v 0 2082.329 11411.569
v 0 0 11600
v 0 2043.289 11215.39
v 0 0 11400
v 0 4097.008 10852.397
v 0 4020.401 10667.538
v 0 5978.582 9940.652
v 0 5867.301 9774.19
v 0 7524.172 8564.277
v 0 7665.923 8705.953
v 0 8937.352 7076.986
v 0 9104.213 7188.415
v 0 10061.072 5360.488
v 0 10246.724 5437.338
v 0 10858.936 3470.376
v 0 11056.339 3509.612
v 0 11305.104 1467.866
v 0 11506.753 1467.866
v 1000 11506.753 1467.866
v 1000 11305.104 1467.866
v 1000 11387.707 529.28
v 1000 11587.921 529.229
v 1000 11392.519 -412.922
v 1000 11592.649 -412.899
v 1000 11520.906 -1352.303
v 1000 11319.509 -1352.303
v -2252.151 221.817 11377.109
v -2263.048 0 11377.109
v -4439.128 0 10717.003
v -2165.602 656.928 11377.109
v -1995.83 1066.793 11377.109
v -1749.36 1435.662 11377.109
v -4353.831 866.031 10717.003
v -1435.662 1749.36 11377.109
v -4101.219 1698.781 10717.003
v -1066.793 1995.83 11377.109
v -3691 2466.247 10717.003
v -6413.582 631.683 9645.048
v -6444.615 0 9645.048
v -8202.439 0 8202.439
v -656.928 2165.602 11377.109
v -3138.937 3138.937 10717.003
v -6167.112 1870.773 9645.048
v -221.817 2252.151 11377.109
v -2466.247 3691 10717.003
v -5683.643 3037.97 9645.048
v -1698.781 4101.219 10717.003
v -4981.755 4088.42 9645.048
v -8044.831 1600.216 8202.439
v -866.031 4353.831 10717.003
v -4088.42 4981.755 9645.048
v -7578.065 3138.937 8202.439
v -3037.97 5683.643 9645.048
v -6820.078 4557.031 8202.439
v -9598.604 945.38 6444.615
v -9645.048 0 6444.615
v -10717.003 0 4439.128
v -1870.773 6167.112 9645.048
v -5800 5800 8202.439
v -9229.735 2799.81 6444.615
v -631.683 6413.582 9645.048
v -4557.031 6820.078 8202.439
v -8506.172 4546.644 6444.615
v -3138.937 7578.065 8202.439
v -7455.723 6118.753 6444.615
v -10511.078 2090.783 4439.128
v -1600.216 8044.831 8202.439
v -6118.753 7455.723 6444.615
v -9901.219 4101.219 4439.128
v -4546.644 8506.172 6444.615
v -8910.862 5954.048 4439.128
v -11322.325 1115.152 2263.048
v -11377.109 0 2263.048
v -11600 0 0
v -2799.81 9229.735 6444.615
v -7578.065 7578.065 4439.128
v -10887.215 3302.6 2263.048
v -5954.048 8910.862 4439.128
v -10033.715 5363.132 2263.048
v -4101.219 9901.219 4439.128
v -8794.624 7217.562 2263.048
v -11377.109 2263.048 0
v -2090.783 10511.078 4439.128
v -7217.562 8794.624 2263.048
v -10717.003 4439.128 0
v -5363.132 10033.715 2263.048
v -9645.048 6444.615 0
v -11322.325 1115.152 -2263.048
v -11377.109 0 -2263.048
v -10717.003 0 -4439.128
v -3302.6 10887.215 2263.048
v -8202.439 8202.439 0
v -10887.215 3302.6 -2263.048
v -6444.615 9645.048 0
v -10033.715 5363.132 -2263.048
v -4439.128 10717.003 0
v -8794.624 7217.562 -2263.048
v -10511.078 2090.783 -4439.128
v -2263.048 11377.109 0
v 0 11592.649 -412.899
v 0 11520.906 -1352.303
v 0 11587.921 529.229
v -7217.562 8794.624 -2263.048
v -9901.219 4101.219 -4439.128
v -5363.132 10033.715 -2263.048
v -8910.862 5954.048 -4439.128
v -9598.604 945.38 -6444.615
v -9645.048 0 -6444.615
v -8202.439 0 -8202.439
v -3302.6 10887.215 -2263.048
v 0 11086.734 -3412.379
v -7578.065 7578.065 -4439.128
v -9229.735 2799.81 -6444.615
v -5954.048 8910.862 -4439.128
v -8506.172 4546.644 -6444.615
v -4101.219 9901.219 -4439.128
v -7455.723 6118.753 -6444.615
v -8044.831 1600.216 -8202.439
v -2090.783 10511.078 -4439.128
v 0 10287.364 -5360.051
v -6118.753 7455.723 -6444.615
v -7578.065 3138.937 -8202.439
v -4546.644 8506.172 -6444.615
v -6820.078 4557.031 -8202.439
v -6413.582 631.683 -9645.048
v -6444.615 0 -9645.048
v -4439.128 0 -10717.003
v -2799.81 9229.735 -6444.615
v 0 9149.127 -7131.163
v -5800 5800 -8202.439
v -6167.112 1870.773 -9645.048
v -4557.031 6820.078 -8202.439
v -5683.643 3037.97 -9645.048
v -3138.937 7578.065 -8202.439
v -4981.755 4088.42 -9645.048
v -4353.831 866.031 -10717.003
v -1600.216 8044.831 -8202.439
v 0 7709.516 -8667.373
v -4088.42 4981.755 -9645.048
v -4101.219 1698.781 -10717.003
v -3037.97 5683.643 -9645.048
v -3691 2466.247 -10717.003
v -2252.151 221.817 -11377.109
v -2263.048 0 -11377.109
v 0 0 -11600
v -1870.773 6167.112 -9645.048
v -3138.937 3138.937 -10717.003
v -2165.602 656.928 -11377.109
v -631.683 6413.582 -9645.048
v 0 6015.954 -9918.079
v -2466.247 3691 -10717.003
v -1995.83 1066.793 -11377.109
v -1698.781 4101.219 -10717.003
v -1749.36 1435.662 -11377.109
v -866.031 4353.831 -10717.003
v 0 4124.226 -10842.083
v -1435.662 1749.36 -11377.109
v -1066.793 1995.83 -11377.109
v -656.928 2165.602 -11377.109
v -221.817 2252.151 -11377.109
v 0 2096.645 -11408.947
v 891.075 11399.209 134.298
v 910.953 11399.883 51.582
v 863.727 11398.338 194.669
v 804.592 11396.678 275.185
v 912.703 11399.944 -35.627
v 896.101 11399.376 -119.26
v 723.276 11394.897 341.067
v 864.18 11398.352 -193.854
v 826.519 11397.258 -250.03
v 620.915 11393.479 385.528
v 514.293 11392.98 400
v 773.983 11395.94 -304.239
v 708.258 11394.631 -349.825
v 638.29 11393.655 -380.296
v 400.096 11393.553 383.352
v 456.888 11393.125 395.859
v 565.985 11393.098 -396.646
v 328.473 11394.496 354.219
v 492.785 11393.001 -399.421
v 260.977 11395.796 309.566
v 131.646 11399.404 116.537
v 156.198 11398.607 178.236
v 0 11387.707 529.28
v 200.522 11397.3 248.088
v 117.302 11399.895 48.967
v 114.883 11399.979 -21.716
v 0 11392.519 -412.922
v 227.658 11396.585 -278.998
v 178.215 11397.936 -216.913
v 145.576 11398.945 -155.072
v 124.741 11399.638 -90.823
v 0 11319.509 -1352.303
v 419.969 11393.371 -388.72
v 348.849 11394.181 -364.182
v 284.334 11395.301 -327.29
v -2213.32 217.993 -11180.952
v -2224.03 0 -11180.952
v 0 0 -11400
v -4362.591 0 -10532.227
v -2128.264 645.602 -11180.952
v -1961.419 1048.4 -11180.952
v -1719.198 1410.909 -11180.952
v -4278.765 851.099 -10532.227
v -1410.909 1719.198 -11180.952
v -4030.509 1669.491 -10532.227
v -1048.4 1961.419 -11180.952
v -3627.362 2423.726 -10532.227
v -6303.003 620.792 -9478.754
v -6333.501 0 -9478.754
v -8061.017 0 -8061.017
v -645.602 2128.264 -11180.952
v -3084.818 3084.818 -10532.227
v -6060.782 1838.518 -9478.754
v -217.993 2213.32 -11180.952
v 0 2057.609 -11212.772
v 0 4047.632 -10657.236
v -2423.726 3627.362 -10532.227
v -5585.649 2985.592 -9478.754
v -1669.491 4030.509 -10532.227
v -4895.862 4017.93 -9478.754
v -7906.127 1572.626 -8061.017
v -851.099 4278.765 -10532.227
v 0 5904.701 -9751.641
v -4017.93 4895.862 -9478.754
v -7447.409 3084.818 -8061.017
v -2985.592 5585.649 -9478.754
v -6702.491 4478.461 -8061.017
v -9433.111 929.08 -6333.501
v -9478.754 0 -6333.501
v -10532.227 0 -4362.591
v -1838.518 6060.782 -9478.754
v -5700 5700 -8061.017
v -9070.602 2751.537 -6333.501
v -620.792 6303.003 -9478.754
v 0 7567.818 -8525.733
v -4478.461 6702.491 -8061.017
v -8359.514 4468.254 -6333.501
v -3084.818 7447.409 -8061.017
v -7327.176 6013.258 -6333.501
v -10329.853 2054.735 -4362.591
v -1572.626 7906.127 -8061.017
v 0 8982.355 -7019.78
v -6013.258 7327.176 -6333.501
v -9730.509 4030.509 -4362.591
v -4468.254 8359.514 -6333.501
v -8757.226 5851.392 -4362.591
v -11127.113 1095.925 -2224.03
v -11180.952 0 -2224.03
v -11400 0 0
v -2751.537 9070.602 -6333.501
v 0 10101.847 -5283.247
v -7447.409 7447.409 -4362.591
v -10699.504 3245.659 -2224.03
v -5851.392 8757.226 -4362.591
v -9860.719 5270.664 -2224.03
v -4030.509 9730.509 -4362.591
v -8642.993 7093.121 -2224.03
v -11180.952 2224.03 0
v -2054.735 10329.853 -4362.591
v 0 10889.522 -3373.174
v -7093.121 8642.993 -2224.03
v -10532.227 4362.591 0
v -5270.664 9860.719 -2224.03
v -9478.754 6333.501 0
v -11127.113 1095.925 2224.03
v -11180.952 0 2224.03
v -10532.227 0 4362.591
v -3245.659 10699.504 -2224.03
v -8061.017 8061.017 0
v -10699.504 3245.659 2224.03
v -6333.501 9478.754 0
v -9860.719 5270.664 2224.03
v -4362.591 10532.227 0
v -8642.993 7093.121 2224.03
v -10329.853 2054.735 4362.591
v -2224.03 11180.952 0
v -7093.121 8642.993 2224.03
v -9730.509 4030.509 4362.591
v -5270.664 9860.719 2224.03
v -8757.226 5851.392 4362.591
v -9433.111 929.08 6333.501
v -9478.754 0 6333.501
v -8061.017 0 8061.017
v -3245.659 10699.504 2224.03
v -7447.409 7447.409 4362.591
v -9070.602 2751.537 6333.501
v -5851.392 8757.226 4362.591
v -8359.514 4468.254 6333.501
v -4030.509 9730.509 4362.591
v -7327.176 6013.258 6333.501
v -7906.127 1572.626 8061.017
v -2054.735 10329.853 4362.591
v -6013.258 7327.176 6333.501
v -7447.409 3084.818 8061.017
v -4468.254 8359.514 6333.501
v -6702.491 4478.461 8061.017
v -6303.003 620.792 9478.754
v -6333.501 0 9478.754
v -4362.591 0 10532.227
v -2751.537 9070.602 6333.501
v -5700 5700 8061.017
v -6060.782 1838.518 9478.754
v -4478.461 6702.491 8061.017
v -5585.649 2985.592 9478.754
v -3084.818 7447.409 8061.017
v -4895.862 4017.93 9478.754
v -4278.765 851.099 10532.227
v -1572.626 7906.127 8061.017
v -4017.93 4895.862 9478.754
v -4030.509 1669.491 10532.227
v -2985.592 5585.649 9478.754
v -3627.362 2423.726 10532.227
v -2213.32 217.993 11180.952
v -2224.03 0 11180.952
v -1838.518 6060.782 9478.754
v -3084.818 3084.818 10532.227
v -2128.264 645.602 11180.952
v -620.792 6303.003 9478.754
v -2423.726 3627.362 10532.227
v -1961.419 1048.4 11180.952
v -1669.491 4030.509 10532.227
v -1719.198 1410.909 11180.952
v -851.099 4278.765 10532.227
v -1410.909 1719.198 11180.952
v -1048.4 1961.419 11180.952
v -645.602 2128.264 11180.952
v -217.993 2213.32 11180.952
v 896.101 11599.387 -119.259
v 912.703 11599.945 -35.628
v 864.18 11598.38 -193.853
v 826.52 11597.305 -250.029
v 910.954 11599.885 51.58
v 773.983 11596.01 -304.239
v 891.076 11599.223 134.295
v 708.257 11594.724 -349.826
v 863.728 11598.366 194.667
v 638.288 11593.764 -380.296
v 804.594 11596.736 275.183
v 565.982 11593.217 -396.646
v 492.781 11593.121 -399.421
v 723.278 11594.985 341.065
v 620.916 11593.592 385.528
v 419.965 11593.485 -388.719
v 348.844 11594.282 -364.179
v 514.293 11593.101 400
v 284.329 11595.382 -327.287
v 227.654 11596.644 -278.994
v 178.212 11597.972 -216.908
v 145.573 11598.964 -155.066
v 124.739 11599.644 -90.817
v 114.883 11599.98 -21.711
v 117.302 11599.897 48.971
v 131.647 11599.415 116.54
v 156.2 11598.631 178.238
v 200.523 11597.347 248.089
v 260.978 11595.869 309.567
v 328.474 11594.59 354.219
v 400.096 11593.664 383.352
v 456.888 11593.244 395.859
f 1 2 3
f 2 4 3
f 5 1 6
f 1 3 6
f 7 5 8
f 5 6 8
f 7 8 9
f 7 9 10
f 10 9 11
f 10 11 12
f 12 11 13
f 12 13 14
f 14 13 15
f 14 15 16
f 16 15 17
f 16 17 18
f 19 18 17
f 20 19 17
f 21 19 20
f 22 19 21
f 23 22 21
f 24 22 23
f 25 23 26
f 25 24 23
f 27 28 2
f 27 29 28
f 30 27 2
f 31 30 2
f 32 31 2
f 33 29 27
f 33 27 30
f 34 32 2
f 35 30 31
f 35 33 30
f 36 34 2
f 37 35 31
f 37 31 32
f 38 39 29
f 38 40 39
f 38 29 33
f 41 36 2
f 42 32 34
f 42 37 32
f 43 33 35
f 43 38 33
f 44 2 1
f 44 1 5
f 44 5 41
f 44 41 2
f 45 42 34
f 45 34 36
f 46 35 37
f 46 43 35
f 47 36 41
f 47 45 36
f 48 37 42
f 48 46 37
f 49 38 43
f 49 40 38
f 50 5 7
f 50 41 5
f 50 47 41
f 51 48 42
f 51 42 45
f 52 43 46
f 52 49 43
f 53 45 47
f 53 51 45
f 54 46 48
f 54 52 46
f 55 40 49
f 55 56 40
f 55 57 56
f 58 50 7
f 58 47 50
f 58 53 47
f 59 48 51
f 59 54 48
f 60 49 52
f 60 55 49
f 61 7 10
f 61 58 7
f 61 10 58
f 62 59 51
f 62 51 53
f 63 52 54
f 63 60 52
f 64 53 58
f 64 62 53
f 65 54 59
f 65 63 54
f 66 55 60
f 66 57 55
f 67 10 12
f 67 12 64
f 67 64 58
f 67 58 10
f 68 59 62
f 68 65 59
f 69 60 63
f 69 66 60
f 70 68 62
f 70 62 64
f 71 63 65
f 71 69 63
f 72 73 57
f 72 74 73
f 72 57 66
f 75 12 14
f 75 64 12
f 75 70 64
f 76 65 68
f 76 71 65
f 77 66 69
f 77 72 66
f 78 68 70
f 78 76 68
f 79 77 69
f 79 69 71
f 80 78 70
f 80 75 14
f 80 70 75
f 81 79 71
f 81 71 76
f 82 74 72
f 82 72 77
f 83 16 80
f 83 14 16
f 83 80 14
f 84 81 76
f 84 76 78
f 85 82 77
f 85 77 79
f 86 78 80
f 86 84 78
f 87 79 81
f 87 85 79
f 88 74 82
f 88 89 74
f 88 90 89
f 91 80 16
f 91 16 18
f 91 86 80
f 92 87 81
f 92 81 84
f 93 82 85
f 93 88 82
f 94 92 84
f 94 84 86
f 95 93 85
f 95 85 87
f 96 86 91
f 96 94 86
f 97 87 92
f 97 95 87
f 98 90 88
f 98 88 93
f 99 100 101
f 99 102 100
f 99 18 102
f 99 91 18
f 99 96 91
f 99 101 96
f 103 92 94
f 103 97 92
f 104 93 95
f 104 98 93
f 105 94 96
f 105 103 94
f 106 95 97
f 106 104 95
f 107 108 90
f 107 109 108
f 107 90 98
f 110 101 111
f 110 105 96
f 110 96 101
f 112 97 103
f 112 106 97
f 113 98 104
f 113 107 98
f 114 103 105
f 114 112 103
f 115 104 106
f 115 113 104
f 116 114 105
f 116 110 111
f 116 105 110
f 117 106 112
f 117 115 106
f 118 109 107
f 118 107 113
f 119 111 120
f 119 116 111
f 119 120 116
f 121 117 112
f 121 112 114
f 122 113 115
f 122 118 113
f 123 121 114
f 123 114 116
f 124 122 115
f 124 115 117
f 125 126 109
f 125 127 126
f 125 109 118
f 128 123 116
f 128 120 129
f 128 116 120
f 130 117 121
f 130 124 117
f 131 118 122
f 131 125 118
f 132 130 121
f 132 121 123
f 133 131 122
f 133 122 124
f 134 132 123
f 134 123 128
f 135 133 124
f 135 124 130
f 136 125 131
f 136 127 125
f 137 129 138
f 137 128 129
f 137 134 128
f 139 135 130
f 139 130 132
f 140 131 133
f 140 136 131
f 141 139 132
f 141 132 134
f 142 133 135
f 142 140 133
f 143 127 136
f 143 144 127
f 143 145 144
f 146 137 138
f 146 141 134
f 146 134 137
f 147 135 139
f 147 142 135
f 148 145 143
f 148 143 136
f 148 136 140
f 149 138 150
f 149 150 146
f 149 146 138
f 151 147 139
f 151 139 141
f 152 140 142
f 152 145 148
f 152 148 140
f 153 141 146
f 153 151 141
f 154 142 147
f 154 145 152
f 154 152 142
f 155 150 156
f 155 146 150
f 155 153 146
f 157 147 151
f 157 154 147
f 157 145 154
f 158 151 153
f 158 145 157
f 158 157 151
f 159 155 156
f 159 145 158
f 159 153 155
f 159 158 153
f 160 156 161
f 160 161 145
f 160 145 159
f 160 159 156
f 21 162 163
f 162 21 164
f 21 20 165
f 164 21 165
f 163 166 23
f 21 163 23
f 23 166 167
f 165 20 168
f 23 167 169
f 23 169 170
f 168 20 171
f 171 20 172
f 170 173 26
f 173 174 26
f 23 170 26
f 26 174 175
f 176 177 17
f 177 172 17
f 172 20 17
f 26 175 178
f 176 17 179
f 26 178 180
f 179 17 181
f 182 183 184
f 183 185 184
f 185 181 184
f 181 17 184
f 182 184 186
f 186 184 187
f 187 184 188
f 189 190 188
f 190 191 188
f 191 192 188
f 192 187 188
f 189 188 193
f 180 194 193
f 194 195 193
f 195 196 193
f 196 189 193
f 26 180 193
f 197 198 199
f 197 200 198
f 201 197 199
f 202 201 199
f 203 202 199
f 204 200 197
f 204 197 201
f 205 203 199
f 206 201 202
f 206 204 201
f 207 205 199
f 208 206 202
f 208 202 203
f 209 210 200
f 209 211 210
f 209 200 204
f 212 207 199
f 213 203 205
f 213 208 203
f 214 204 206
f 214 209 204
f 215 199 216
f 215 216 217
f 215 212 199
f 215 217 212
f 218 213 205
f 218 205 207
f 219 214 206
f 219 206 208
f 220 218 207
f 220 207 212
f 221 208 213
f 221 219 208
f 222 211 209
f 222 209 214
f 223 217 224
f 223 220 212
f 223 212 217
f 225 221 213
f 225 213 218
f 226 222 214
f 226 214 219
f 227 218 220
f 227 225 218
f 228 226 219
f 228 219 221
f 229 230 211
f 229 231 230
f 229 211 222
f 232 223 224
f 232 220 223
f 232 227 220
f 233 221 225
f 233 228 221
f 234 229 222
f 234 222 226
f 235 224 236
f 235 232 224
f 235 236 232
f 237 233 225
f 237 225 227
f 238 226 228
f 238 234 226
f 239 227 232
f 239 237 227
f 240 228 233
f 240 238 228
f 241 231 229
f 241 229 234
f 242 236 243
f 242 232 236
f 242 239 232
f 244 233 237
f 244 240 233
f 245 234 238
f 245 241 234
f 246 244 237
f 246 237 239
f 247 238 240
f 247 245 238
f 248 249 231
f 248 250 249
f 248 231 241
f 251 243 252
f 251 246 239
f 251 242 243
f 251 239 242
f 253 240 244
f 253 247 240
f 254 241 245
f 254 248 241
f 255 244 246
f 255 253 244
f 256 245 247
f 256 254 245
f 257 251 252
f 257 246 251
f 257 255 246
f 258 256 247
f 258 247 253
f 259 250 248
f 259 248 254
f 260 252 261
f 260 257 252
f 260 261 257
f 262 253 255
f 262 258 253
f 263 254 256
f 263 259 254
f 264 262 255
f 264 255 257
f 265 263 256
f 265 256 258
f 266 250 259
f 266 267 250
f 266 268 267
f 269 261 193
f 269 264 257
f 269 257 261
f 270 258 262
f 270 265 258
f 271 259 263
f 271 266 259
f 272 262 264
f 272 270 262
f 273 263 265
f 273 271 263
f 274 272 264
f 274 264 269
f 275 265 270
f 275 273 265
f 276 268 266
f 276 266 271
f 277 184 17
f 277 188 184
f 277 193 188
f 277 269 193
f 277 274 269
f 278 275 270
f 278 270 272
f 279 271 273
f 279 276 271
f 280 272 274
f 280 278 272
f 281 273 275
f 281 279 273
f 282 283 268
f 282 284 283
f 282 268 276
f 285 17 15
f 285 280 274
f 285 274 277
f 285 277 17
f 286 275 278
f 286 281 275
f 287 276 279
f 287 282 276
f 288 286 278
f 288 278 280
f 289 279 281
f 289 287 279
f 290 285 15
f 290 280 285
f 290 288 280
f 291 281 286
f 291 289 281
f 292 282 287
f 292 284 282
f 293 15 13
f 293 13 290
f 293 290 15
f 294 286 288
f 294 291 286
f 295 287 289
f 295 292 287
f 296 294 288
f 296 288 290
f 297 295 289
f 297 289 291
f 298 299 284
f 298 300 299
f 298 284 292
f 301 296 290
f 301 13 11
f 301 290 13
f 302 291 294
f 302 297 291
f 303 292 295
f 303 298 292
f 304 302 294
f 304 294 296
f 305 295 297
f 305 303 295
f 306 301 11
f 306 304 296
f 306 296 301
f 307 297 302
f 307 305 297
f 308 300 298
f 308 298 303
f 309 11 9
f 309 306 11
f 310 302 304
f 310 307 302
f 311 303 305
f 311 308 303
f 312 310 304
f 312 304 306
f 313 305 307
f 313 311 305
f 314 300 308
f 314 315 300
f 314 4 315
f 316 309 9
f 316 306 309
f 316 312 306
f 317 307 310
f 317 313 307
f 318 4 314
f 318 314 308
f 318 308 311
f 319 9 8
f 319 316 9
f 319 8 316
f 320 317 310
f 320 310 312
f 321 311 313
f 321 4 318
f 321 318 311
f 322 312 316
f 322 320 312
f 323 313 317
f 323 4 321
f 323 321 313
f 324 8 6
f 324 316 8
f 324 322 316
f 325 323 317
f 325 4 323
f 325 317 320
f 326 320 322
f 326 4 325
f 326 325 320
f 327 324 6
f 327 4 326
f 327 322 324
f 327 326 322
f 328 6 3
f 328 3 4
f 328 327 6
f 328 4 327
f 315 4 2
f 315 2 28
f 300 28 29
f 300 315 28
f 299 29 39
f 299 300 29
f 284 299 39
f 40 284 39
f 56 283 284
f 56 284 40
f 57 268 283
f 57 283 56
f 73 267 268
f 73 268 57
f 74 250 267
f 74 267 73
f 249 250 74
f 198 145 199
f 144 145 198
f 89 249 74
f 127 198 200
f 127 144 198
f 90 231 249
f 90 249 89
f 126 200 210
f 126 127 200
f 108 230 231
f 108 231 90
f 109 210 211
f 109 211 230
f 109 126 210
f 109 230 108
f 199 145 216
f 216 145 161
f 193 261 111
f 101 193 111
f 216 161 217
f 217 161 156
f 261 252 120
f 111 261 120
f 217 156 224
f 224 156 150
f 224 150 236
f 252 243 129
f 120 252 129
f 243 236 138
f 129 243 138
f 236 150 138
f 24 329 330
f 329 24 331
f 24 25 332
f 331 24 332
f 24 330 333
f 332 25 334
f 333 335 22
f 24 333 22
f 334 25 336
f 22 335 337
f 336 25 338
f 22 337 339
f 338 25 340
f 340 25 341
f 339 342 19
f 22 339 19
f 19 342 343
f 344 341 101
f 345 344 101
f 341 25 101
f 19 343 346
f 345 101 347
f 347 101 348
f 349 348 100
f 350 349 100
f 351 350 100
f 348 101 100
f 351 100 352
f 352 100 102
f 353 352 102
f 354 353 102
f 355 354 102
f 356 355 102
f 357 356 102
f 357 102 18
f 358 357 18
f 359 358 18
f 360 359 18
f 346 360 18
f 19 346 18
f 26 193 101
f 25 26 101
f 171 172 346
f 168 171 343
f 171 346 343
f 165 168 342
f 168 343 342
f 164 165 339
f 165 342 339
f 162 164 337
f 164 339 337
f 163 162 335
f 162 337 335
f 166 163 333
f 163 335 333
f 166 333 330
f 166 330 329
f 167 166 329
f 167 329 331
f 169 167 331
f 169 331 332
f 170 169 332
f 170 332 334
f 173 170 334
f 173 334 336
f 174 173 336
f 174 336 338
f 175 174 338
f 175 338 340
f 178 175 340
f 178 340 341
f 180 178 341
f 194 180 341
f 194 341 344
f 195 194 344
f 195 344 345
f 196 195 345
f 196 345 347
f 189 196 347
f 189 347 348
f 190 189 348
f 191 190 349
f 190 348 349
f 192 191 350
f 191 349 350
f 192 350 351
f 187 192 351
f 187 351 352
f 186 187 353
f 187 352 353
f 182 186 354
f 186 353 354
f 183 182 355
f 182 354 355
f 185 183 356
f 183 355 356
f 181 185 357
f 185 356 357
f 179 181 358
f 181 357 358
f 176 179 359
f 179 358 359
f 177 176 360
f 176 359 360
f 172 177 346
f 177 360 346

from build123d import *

# Parameters (mm, degrees)
REVOLVE1_ANGLE      = 90
BOSS_EXTRUDE1_DEPTH = 1000
SKETCH4_R           = 400
CUT_EXTRUDE1_DEPTH  = 1000


with BuildPart() as part:
    # Sketch1 → Revolve1 (revolve)
    with BuildSketch(Plane(origin=(0, 0, 0), x_dir=(1, 0, 0), z_dir=(0, 1, 0))):
        with BuildLine():
            Line((0, 11600), (0, 11400))
            ThreePointArc((0, 11400), (-11400, 0), (0, -11400))
            Line((0, -11400), (0, -11600))
            ThreePointArc((0, -11600), (-11600, 0), (0, 11600))
        make_face()
    revolve(axis=Axis((0, 0, 53.164398698), (0, 0, -1)), revolution_arc=REVOLVE1_ANGLE)

    # Sketch3 → Boss-Extrude1 (add)
    with BuildSketch(Plane(origin=(0, 0, 0), x_dir=(0, 0, -1), z_dir=(1, 0, 0))):
        with BuildLine():
            Line((-1467.86571595, 11506.75324494), (-1467.86571595, 11305.103725306))
            ThreePointArc((-1467.86571595, 11305.103725306), (-58.228635227, 11399.851289646), (1352.302778281, 11319.508699403))
            Line((1352.302778281, 11319.508699403), (1352.302778281, 11520.906092658))
            ThreePointArc((1352.302778281, 11520.906092658), (-58.213176475, 11599.853931239), (-1467.86571595, 11506.75324494))
        make_face()
    extrude(amount=BOSS_EXTRUDE1_DEPTH)

    # Sketch4 → Cut-Extrude1 (cut)
    with BuildSketch(Plane(origin=(0, 11600, 0), x_dir=(1, 0, 0), z_dir=(0, 1, 0))):
        with Locations(Location((514.293273851, 0, 0), (0, 0, 270))):
            Circle(SKETCH4_R)
    extrude(amount=-CUT_EXTRUDE1_DEPTH, mode=Mode.SUBTRACT)


solid = part.part
